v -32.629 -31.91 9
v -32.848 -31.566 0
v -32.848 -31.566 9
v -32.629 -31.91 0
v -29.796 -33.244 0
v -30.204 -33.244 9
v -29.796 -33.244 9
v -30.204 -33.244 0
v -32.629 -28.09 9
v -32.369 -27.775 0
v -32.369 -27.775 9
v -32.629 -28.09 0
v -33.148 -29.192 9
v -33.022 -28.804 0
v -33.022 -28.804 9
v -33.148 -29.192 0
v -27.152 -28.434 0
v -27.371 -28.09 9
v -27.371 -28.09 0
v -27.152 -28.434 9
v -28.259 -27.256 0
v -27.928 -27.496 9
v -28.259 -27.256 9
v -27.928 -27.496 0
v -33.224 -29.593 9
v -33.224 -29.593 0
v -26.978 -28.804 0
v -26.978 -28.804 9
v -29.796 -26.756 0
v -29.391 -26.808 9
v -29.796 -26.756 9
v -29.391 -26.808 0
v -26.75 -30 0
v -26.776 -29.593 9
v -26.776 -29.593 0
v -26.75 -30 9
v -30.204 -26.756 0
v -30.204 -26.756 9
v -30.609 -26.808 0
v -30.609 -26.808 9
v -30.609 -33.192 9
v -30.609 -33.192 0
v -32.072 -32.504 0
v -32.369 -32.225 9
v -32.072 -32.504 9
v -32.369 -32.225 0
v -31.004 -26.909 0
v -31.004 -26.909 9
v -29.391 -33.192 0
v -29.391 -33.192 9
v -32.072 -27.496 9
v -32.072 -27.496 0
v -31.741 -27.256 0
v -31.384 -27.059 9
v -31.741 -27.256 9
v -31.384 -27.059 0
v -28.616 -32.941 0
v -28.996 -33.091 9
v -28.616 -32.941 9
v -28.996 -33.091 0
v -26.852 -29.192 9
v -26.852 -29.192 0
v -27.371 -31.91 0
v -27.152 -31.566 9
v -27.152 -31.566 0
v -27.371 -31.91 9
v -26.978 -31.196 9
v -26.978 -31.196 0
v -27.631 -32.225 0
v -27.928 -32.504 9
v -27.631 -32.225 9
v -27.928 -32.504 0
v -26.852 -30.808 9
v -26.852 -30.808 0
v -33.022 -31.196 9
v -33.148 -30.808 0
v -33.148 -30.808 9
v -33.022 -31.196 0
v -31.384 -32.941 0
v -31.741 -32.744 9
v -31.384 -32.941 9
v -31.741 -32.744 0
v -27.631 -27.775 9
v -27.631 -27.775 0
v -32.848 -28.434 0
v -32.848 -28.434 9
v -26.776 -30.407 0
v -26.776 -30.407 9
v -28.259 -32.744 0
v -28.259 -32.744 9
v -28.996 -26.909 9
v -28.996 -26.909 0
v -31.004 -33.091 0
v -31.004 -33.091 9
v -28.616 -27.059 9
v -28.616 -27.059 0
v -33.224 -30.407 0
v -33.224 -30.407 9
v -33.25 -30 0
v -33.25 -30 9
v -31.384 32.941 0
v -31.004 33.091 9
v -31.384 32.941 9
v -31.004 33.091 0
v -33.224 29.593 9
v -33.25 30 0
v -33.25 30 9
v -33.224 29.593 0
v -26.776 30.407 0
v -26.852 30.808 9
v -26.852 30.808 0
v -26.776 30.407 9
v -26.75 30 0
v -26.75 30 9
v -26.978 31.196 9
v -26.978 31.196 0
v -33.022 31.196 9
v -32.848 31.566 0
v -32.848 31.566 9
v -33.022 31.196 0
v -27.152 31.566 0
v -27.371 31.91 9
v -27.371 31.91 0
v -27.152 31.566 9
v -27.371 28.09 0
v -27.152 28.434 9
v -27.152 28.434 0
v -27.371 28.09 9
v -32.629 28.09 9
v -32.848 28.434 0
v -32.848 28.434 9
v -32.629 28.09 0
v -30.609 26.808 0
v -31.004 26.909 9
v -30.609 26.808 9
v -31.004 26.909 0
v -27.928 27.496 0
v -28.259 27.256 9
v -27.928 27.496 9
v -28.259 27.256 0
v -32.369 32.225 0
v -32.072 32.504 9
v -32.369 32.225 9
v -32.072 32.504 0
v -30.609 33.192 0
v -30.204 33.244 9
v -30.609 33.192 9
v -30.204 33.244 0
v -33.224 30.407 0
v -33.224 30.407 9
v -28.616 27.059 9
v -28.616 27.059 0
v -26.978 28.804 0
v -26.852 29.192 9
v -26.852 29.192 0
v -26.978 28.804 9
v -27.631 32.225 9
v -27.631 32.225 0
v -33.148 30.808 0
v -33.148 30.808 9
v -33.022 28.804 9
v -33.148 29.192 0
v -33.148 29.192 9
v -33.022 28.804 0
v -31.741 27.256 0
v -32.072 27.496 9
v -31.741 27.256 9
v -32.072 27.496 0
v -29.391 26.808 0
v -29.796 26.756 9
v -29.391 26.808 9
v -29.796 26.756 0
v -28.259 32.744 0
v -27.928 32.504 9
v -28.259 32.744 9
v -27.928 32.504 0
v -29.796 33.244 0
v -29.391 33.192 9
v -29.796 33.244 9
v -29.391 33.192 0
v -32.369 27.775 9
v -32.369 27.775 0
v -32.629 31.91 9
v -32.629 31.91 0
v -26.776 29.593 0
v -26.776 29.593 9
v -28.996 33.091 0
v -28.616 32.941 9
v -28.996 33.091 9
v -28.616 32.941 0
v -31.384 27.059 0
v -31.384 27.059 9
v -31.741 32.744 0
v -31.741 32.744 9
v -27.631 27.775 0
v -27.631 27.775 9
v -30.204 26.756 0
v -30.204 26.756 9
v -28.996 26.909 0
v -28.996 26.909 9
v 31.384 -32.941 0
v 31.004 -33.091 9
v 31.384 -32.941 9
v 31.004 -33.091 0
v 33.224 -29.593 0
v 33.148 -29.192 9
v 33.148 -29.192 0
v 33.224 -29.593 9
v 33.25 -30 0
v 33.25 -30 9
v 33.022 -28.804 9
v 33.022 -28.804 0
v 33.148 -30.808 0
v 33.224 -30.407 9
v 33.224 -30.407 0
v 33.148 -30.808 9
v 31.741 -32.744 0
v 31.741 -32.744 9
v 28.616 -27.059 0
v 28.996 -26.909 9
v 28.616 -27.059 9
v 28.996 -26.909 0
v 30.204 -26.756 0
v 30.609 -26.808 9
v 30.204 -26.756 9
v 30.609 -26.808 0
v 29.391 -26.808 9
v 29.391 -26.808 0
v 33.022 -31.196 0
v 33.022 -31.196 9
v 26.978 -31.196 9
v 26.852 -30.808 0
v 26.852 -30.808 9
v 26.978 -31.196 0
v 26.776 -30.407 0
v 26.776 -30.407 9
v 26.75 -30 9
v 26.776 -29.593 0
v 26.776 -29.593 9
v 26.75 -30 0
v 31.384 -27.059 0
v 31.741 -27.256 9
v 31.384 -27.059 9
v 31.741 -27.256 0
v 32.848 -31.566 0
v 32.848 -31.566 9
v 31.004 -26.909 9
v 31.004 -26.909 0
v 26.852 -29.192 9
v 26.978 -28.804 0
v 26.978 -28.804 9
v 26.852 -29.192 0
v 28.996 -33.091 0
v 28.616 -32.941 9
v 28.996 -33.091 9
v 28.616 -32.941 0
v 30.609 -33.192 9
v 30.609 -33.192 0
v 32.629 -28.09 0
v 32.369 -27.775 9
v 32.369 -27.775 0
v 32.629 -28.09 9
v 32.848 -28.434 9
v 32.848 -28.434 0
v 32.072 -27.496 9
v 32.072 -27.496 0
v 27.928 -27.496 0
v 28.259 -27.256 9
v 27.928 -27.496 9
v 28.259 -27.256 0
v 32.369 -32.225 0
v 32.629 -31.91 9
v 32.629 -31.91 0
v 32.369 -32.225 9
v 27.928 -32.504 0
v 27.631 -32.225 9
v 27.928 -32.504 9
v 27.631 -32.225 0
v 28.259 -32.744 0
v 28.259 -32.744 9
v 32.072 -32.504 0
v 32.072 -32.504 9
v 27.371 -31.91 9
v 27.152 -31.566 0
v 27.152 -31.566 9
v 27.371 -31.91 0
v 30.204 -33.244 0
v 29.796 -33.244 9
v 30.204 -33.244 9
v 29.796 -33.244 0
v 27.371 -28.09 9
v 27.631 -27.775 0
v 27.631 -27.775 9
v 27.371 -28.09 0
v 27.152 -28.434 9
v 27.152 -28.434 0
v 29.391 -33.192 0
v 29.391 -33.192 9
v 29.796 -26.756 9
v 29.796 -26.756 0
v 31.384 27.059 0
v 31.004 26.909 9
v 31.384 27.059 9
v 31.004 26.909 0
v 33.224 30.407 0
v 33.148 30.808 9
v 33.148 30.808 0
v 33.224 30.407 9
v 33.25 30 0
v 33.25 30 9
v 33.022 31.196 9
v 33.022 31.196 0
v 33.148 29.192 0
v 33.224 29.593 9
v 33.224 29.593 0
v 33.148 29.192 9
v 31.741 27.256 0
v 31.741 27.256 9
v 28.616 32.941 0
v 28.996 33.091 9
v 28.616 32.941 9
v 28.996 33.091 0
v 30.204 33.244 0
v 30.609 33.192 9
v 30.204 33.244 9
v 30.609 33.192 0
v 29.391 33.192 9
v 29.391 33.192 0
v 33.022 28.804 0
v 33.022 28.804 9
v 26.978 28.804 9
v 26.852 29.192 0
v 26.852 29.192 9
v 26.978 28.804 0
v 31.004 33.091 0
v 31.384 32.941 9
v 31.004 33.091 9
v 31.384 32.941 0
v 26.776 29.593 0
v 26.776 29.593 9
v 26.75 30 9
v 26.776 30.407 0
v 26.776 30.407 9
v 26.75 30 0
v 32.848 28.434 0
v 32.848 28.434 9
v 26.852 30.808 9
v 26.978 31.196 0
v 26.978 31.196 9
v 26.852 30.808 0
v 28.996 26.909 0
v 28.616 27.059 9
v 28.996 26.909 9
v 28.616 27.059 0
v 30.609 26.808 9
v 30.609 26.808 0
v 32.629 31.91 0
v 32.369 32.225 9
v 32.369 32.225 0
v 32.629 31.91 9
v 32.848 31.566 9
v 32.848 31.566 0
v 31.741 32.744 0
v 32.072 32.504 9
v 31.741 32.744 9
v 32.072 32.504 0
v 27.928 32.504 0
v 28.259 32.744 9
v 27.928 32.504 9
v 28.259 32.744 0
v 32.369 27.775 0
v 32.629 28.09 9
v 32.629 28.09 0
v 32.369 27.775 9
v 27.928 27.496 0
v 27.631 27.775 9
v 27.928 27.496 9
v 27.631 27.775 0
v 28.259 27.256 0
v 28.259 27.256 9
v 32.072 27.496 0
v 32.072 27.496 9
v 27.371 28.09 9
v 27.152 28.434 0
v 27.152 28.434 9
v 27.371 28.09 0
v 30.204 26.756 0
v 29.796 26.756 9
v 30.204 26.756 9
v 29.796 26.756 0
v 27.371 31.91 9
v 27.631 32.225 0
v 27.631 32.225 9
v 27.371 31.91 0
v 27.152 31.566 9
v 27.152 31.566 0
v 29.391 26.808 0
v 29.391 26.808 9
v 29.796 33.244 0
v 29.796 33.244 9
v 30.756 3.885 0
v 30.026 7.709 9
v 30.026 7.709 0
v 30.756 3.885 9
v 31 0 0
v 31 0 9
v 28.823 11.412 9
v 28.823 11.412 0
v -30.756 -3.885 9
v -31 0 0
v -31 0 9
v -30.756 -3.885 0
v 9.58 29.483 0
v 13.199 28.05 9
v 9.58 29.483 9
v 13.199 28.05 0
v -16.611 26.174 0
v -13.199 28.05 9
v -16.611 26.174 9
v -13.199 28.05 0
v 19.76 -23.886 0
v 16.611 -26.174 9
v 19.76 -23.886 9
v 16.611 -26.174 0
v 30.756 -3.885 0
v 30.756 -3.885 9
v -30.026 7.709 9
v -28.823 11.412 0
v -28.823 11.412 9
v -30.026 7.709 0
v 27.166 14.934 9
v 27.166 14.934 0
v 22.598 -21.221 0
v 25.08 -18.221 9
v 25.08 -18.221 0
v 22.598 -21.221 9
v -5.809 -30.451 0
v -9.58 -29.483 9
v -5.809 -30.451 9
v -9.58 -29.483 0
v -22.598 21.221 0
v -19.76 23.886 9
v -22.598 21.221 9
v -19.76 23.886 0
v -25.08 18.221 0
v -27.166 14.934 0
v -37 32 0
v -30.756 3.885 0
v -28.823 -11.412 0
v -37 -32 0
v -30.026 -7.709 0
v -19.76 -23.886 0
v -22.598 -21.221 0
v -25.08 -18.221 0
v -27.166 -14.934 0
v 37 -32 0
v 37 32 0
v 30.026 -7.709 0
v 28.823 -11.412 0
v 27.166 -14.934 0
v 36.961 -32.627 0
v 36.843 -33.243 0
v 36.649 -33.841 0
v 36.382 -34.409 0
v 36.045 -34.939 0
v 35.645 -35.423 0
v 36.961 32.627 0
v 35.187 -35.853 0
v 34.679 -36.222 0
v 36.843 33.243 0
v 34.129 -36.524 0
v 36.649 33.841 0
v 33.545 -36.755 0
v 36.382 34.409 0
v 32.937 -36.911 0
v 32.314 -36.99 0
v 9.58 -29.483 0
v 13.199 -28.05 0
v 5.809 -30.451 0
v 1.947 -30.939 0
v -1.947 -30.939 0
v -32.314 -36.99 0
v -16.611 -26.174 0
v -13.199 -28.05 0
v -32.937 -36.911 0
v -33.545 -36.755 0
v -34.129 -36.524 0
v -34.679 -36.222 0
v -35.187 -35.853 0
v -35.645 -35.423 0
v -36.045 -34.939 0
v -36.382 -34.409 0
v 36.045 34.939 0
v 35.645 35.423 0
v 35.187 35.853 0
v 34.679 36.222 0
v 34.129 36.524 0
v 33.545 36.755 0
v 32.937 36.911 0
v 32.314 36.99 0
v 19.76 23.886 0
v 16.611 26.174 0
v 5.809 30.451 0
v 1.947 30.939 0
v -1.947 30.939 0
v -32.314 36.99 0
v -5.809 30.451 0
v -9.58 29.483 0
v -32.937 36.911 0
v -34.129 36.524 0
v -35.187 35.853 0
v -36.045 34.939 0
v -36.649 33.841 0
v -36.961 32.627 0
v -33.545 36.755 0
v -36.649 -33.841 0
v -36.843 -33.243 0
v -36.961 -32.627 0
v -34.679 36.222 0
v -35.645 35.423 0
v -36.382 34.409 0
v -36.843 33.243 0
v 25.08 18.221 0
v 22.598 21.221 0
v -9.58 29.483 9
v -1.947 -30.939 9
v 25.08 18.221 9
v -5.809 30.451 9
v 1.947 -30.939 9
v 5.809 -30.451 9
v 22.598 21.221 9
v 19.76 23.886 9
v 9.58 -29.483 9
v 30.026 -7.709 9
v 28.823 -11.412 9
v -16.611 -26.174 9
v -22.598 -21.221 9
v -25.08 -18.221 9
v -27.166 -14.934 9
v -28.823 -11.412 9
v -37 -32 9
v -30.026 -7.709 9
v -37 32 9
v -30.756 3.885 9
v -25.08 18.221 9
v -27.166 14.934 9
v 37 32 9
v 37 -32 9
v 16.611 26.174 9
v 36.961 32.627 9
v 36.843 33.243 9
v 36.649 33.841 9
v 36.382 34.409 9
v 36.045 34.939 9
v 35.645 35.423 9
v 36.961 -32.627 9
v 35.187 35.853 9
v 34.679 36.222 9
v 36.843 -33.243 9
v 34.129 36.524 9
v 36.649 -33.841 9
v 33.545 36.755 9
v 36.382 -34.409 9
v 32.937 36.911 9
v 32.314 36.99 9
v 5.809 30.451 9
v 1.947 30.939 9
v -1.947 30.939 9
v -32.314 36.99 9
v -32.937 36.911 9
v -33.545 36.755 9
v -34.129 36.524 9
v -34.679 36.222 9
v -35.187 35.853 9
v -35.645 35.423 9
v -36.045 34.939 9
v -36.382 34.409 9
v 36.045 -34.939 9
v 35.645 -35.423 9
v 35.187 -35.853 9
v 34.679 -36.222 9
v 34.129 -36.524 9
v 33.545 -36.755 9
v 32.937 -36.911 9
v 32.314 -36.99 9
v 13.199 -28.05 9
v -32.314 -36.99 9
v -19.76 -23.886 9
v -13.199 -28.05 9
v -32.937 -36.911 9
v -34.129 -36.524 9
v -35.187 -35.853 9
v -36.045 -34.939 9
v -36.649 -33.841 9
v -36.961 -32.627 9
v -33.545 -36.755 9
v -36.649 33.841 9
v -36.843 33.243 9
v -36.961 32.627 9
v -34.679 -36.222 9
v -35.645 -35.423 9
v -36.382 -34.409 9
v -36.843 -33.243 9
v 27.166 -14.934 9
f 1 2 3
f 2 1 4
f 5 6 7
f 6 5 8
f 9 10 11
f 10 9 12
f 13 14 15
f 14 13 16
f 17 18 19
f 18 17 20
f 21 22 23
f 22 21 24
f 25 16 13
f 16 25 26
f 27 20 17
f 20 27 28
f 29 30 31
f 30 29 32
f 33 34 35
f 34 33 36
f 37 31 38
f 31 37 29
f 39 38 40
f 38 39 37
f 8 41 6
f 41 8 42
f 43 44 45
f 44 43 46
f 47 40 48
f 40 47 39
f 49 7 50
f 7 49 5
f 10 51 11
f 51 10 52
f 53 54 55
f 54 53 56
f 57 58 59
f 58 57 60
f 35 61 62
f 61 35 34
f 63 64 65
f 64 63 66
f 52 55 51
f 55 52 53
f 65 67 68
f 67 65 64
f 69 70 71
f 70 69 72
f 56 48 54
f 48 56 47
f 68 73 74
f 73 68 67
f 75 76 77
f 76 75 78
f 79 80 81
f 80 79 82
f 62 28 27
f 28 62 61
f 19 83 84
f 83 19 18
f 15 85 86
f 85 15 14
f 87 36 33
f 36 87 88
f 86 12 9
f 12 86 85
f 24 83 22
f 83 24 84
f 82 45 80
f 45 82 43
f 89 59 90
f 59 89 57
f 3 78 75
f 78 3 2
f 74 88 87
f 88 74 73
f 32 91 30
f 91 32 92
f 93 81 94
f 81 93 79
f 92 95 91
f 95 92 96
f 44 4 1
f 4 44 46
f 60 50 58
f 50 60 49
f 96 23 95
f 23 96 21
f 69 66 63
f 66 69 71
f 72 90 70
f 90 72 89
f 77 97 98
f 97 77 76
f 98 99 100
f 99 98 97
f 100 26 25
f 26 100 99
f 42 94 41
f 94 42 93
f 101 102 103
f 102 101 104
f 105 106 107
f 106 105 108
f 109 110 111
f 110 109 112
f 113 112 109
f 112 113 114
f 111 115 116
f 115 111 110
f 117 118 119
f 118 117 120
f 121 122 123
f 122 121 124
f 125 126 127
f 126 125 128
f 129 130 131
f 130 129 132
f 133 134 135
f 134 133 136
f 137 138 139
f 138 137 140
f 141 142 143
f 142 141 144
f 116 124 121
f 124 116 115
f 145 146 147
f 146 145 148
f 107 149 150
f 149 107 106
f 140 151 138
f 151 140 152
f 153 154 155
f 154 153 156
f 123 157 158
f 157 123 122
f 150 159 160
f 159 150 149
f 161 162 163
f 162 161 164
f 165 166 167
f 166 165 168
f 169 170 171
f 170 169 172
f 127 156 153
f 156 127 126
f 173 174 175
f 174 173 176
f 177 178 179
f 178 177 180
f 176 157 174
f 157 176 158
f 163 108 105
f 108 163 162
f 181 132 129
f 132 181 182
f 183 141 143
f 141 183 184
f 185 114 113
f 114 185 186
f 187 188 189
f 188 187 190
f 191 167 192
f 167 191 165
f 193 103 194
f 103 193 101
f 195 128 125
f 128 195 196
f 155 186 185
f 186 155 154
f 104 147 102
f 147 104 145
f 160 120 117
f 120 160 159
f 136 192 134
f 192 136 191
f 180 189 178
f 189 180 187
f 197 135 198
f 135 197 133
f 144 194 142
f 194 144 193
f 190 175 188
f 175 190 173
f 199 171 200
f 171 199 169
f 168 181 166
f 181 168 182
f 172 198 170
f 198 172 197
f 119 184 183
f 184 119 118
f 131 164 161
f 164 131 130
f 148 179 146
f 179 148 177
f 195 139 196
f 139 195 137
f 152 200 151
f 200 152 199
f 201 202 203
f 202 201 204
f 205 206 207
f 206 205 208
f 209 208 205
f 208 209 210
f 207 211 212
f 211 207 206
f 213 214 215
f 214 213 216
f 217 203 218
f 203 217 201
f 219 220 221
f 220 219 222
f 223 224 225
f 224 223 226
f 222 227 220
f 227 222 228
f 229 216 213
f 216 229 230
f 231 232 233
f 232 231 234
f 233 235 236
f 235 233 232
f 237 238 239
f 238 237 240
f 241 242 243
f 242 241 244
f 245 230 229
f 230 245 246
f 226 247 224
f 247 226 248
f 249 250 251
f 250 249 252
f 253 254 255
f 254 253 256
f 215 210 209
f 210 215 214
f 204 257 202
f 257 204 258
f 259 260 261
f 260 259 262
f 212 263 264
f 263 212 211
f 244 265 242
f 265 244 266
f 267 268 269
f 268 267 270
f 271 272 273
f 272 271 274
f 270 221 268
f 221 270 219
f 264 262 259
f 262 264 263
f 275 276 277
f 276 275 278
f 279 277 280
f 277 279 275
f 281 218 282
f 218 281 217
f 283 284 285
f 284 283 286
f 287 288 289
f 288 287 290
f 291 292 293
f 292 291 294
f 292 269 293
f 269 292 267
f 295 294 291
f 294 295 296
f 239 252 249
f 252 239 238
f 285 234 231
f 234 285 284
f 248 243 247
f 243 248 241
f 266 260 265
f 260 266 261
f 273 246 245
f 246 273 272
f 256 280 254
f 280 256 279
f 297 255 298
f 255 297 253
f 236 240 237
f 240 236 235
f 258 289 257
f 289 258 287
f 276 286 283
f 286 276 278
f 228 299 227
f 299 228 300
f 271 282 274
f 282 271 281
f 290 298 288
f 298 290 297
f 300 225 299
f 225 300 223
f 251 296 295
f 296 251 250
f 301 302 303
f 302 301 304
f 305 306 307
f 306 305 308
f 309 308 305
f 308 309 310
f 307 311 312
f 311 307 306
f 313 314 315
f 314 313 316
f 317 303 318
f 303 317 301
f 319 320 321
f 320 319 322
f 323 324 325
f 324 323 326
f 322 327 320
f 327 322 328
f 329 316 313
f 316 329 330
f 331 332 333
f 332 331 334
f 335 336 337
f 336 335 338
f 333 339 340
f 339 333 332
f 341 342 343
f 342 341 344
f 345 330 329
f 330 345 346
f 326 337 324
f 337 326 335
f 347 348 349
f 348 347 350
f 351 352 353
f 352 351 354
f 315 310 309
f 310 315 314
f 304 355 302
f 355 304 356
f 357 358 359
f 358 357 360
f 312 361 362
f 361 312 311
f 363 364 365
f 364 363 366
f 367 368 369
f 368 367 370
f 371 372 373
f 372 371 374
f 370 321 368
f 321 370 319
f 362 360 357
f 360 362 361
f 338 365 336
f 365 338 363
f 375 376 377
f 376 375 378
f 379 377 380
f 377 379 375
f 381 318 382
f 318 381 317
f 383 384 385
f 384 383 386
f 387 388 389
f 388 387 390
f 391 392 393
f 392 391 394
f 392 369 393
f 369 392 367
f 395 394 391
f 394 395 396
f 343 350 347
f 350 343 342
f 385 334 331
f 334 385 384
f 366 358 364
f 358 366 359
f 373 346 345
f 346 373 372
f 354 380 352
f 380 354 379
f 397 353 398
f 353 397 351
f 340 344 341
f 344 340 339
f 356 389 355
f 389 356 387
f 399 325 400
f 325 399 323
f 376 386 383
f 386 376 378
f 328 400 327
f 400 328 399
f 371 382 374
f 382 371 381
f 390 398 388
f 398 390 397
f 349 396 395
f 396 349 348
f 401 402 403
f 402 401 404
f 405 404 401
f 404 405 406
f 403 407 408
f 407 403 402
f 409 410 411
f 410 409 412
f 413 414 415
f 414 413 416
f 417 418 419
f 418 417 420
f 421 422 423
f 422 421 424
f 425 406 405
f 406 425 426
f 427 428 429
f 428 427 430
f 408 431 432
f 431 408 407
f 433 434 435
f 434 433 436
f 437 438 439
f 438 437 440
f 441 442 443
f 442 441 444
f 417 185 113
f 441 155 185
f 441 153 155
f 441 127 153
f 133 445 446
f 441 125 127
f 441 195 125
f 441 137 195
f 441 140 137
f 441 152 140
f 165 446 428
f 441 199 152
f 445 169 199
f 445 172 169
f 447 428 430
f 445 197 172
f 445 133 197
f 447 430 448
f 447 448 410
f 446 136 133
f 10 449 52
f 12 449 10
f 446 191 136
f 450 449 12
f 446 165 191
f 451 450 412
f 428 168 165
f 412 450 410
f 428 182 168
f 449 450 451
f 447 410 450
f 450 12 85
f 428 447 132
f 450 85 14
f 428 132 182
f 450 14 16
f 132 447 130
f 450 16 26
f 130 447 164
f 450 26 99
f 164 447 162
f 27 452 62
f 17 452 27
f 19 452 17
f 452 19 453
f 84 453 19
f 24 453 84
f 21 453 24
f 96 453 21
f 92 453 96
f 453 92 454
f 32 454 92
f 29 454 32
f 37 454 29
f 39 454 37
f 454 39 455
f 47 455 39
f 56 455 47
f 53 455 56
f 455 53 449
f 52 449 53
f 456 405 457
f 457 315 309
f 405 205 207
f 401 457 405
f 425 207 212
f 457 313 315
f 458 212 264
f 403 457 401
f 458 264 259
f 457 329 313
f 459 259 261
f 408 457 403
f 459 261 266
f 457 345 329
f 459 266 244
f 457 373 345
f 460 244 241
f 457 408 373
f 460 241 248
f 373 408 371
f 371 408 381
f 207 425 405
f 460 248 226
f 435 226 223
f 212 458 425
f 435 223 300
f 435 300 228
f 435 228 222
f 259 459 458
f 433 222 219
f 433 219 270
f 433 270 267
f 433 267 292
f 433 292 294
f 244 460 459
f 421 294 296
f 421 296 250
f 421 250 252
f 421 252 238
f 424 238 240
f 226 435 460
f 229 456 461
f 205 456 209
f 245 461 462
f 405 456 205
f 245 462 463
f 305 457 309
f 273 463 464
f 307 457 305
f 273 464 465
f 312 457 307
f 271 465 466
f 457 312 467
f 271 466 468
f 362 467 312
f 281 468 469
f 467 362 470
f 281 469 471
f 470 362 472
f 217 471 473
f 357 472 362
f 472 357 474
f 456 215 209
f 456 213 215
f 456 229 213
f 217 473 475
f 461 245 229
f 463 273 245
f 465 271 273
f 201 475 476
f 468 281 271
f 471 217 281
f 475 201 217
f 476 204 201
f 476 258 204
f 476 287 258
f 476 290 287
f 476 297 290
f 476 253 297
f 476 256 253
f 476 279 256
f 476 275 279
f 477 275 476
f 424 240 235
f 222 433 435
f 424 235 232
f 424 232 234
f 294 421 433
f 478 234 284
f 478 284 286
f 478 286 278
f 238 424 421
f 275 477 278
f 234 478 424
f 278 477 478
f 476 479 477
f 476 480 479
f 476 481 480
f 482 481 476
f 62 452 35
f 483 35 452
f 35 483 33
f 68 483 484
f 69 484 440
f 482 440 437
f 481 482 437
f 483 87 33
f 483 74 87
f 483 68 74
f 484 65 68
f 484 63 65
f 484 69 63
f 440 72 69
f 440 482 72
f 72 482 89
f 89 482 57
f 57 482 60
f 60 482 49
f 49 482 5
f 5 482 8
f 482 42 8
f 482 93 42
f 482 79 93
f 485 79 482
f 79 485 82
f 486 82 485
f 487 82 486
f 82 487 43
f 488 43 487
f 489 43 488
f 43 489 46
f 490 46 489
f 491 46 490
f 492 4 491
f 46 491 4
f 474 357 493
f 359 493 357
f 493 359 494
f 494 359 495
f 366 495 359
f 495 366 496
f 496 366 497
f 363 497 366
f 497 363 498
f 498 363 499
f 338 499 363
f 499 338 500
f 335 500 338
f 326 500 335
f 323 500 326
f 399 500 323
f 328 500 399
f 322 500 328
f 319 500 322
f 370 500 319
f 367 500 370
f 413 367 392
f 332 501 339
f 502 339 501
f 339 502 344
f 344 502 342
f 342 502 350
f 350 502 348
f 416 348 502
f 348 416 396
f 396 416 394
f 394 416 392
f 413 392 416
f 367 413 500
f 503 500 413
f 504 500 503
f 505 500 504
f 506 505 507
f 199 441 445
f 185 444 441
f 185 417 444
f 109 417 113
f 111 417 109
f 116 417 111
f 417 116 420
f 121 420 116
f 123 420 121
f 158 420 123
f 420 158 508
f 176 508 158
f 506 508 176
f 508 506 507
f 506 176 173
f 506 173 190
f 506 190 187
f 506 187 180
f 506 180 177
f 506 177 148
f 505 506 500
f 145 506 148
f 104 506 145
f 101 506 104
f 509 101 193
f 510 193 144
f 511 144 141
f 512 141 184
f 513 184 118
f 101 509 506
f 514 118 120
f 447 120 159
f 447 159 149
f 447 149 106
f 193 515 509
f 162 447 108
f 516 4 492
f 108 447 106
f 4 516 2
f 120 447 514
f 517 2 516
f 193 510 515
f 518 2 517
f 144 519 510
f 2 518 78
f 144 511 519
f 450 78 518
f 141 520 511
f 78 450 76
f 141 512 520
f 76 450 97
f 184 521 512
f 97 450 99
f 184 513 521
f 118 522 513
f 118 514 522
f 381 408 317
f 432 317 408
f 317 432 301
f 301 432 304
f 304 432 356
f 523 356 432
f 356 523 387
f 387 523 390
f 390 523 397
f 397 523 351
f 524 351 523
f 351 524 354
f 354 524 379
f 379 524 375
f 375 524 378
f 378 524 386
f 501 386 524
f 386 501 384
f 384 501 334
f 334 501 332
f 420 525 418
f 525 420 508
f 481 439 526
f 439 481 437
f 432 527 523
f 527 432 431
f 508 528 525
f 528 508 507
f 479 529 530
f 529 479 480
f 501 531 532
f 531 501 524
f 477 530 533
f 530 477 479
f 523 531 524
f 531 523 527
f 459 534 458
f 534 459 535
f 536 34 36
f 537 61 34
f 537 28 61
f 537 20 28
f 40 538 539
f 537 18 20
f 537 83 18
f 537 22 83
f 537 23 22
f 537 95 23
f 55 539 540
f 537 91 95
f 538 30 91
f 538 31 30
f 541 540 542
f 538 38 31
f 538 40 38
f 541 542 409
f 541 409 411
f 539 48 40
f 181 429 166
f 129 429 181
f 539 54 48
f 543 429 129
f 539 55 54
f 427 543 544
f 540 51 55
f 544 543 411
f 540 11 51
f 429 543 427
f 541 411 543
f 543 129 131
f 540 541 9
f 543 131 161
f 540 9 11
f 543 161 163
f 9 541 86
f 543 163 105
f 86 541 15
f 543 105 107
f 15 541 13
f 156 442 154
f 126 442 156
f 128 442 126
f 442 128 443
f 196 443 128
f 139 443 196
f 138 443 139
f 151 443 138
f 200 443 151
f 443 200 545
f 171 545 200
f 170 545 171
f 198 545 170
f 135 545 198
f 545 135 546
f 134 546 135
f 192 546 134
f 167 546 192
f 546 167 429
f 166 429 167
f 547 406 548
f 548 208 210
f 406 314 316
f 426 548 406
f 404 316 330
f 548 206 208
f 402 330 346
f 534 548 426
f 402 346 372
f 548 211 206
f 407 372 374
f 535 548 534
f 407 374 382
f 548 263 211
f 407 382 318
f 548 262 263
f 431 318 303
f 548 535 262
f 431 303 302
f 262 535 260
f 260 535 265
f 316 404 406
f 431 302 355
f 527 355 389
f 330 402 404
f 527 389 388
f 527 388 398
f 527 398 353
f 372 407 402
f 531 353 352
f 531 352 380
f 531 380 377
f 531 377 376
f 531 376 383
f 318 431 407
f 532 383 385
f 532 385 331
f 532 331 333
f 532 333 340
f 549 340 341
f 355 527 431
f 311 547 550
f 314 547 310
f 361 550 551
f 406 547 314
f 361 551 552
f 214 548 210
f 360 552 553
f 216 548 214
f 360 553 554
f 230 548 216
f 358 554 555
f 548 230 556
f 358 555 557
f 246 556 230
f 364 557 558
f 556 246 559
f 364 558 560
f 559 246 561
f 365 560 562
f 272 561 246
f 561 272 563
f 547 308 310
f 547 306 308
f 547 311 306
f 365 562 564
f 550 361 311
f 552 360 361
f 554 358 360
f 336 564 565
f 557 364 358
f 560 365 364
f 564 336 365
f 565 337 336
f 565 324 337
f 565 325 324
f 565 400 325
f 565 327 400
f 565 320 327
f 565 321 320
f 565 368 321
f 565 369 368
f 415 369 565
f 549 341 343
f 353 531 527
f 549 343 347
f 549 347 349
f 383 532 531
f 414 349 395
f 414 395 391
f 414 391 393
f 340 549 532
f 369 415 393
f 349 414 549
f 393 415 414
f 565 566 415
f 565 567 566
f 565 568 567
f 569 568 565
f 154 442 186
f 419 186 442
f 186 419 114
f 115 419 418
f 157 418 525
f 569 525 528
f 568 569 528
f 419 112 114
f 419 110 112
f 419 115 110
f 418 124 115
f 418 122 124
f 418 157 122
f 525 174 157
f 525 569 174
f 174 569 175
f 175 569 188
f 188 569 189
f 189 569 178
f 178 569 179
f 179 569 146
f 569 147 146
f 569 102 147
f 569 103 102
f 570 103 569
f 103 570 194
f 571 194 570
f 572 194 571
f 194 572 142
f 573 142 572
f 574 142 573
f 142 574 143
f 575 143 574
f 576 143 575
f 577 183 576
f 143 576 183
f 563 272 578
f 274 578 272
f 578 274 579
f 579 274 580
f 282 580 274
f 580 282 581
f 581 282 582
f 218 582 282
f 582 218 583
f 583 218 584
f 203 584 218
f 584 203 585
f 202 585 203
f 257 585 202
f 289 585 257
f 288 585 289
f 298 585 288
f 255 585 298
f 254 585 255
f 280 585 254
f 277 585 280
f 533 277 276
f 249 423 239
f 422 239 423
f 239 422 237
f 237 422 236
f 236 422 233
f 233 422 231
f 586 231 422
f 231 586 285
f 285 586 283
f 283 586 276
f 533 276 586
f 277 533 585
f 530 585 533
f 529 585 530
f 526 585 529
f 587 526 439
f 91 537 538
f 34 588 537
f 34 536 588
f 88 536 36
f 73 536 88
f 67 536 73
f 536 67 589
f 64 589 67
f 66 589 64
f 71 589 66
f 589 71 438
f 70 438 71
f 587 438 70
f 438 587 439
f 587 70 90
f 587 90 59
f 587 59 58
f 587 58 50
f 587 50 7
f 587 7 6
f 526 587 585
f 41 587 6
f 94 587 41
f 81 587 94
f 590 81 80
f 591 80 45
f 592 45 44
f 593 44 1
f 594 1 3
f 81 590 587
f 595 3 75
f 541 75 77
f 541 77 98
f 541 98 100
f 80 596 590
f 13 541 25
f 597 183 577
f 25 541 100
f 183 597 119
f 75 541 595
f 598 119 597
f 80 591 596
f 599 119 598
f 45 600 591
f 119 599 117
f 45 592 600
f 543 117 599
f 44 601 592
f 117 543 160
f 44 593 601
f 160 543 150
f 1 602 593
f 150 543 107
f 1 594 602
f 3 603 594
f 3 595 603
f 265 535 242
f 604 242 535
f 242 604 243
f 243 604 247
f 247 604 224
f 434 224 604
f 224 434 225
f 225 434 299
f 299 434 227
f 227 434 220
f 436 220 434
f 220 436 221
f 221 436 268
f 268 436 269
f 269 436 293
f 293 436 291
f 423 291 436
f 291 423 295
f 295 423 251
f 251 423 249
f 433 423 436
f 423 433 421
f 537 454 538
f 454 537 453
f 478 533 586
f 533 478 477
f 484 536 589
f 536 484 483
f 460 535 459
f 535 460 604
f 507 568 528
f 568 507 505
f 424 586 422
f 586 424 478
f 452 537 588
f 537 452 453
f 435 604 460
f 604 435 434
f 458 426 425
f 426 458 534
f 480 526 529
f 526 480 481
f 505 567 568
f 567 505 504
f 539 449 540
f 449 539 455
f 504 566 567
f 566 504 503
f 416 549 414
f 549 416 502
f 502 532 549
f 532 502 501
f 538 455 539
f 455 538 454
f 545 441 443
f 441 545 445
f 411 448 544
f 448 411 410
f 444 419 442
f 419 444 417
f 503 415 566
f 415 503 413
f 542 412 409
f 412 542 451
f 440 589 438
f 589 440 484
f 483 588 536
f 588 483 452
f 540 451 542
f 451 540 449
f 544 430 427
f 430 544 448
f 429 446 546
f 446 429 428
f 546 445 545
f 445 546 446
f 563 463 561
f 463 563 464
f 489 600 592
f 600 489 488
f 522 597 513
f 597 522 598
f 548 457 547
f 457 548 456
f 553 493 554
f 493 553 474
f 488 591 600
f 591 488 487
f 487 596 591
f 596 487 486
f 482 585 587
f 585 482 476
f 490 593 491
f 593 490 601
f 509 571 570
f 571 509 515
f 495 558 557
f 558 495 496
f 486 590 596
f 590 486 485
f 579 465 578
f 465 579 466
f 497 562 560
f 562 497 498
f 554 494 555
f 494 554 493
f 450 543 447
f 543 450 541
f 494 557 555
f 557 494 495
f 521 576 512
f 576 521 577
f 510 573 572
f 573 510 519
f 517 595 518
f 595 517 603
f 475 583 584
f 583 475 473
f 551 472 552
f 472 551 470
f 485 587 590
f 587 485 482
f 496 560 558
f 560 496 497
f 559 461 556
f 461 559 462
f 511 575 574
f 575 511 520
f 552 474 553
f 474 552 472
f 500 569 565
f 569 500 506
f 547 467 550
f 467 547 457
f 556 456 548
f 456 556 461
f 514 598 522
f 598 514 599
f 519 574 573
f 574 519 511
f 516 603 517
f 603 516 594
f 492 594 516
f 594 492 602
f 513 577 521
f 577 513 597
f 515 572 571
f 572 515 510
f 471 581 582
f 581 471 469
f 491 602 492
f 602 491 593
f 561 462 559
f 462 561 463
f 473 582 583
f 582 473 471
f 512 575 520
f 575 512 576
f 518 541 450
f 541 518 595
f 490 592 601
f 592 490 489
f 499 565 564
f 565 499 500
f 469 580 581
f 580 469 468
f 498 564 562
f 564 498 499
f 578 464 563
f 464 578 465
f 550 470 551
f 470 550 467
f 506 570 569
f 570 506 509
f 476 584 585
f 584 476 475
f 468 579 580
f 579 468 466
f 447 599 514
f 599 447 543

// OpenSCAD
$fn = 50;


difference() {
	union() {
		hull() {
			translate(v = [-32.0000000000, 32.0000000000, 0]) {
				cylinder(h = 9, r = 5);
			}
			translate(v = [32.0000000000, 32.0000000000, 0]) {
				cylinder(h = 9, r = 5);
			}
			translate(v = [-32.0000000000, -32.0000000000, 0]) {
				cylinder(h = 9, r = 5);
			}
			translate(v = [32.0000000000, -32.0000000000, 0]) {
				cylinder(h = 9, r = 5);
			}
		}
	}
	union() {
		#translate(v = [-30.0000000000, -30.0000000000, -100.0000000000]) {
			cylinder(h = 200, r = 3.2500000000);
		}
		#translate(v = [-30.0000000000, 30.0000000000, -100.0000000000]) {
			cylinder(h = 200, r = 3.2500000000);
		}
		#translate(v = [30.0000000000, -30.0000000000, -100.0000000000]) {
			cylinder(h = 200, r = 3.2500000000);
		}
		#translate(v = [30.0000000000, 30.0000000000, -100.0000000000]) {
			cylinder(h = 200, r = 3.2500000000);
		}
		#cylinder(h = 9, r = 31.0000000000);
	}
}
